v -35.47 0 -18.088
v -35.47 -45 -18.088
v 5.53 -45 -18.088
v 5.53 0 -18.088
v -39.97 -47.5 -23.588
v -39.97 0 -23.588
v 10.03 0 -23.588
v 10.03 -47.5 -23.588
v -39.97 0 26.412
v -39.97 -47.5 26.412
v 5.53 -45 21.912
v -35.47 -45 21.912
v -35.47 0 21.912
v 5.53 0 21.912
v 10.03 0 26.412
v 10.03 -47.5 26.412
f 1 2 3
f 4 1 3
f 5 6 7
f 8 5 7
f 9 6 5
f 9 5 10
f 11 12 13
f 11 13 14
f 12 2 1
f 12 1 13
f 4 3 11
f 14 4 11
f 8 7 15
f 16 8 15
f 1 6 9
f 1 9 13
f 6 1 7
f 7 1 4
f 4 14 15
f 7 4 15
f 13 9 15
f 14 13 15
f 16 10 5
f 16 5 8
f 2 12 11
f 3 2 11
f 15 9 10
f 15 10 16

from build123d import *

# Parameters (mm, degrees)
F0_W     = 50
F0_H     = 50
F0_W_2   = 41
F0_H_2   = 40
F1_DEPTH = 47.5
F2_DEPTH = 45


# Not quite as in the source:
# - a feature names something its author has since deleted; it is built from what else it names


with BuildPart() as f1:
    # F0 (on Front) → F1 (new body)
    with BuildSketch(Plane.XZ):
        with Locations((-14.9696101435, 1.412372324)):
            Rectangle(F0_W, F0_H)
        with Locations((-14.9696101435, 1.912372324)):
            Rectangle(F0_W_2, F0_H_2, mode=Mode.SUBTRACT)
        with Locations((-14.9696101435, 1.912372324)):
            Rectangle(F0_W_2, F0_H_2)
    extrude(amount=F1_DEPTH)

    # F0 (on Front) → F2 (cut)
    with BuildSketch(Plane.XZ):
        with Locations((-14.9696101435, 1.912372324)):
            Rectangle(F0_W_2, F0_H_2)
    extrude(amount=F2_DEPTH, mode=Mode.SUBTRACT)


solid = f1.part
